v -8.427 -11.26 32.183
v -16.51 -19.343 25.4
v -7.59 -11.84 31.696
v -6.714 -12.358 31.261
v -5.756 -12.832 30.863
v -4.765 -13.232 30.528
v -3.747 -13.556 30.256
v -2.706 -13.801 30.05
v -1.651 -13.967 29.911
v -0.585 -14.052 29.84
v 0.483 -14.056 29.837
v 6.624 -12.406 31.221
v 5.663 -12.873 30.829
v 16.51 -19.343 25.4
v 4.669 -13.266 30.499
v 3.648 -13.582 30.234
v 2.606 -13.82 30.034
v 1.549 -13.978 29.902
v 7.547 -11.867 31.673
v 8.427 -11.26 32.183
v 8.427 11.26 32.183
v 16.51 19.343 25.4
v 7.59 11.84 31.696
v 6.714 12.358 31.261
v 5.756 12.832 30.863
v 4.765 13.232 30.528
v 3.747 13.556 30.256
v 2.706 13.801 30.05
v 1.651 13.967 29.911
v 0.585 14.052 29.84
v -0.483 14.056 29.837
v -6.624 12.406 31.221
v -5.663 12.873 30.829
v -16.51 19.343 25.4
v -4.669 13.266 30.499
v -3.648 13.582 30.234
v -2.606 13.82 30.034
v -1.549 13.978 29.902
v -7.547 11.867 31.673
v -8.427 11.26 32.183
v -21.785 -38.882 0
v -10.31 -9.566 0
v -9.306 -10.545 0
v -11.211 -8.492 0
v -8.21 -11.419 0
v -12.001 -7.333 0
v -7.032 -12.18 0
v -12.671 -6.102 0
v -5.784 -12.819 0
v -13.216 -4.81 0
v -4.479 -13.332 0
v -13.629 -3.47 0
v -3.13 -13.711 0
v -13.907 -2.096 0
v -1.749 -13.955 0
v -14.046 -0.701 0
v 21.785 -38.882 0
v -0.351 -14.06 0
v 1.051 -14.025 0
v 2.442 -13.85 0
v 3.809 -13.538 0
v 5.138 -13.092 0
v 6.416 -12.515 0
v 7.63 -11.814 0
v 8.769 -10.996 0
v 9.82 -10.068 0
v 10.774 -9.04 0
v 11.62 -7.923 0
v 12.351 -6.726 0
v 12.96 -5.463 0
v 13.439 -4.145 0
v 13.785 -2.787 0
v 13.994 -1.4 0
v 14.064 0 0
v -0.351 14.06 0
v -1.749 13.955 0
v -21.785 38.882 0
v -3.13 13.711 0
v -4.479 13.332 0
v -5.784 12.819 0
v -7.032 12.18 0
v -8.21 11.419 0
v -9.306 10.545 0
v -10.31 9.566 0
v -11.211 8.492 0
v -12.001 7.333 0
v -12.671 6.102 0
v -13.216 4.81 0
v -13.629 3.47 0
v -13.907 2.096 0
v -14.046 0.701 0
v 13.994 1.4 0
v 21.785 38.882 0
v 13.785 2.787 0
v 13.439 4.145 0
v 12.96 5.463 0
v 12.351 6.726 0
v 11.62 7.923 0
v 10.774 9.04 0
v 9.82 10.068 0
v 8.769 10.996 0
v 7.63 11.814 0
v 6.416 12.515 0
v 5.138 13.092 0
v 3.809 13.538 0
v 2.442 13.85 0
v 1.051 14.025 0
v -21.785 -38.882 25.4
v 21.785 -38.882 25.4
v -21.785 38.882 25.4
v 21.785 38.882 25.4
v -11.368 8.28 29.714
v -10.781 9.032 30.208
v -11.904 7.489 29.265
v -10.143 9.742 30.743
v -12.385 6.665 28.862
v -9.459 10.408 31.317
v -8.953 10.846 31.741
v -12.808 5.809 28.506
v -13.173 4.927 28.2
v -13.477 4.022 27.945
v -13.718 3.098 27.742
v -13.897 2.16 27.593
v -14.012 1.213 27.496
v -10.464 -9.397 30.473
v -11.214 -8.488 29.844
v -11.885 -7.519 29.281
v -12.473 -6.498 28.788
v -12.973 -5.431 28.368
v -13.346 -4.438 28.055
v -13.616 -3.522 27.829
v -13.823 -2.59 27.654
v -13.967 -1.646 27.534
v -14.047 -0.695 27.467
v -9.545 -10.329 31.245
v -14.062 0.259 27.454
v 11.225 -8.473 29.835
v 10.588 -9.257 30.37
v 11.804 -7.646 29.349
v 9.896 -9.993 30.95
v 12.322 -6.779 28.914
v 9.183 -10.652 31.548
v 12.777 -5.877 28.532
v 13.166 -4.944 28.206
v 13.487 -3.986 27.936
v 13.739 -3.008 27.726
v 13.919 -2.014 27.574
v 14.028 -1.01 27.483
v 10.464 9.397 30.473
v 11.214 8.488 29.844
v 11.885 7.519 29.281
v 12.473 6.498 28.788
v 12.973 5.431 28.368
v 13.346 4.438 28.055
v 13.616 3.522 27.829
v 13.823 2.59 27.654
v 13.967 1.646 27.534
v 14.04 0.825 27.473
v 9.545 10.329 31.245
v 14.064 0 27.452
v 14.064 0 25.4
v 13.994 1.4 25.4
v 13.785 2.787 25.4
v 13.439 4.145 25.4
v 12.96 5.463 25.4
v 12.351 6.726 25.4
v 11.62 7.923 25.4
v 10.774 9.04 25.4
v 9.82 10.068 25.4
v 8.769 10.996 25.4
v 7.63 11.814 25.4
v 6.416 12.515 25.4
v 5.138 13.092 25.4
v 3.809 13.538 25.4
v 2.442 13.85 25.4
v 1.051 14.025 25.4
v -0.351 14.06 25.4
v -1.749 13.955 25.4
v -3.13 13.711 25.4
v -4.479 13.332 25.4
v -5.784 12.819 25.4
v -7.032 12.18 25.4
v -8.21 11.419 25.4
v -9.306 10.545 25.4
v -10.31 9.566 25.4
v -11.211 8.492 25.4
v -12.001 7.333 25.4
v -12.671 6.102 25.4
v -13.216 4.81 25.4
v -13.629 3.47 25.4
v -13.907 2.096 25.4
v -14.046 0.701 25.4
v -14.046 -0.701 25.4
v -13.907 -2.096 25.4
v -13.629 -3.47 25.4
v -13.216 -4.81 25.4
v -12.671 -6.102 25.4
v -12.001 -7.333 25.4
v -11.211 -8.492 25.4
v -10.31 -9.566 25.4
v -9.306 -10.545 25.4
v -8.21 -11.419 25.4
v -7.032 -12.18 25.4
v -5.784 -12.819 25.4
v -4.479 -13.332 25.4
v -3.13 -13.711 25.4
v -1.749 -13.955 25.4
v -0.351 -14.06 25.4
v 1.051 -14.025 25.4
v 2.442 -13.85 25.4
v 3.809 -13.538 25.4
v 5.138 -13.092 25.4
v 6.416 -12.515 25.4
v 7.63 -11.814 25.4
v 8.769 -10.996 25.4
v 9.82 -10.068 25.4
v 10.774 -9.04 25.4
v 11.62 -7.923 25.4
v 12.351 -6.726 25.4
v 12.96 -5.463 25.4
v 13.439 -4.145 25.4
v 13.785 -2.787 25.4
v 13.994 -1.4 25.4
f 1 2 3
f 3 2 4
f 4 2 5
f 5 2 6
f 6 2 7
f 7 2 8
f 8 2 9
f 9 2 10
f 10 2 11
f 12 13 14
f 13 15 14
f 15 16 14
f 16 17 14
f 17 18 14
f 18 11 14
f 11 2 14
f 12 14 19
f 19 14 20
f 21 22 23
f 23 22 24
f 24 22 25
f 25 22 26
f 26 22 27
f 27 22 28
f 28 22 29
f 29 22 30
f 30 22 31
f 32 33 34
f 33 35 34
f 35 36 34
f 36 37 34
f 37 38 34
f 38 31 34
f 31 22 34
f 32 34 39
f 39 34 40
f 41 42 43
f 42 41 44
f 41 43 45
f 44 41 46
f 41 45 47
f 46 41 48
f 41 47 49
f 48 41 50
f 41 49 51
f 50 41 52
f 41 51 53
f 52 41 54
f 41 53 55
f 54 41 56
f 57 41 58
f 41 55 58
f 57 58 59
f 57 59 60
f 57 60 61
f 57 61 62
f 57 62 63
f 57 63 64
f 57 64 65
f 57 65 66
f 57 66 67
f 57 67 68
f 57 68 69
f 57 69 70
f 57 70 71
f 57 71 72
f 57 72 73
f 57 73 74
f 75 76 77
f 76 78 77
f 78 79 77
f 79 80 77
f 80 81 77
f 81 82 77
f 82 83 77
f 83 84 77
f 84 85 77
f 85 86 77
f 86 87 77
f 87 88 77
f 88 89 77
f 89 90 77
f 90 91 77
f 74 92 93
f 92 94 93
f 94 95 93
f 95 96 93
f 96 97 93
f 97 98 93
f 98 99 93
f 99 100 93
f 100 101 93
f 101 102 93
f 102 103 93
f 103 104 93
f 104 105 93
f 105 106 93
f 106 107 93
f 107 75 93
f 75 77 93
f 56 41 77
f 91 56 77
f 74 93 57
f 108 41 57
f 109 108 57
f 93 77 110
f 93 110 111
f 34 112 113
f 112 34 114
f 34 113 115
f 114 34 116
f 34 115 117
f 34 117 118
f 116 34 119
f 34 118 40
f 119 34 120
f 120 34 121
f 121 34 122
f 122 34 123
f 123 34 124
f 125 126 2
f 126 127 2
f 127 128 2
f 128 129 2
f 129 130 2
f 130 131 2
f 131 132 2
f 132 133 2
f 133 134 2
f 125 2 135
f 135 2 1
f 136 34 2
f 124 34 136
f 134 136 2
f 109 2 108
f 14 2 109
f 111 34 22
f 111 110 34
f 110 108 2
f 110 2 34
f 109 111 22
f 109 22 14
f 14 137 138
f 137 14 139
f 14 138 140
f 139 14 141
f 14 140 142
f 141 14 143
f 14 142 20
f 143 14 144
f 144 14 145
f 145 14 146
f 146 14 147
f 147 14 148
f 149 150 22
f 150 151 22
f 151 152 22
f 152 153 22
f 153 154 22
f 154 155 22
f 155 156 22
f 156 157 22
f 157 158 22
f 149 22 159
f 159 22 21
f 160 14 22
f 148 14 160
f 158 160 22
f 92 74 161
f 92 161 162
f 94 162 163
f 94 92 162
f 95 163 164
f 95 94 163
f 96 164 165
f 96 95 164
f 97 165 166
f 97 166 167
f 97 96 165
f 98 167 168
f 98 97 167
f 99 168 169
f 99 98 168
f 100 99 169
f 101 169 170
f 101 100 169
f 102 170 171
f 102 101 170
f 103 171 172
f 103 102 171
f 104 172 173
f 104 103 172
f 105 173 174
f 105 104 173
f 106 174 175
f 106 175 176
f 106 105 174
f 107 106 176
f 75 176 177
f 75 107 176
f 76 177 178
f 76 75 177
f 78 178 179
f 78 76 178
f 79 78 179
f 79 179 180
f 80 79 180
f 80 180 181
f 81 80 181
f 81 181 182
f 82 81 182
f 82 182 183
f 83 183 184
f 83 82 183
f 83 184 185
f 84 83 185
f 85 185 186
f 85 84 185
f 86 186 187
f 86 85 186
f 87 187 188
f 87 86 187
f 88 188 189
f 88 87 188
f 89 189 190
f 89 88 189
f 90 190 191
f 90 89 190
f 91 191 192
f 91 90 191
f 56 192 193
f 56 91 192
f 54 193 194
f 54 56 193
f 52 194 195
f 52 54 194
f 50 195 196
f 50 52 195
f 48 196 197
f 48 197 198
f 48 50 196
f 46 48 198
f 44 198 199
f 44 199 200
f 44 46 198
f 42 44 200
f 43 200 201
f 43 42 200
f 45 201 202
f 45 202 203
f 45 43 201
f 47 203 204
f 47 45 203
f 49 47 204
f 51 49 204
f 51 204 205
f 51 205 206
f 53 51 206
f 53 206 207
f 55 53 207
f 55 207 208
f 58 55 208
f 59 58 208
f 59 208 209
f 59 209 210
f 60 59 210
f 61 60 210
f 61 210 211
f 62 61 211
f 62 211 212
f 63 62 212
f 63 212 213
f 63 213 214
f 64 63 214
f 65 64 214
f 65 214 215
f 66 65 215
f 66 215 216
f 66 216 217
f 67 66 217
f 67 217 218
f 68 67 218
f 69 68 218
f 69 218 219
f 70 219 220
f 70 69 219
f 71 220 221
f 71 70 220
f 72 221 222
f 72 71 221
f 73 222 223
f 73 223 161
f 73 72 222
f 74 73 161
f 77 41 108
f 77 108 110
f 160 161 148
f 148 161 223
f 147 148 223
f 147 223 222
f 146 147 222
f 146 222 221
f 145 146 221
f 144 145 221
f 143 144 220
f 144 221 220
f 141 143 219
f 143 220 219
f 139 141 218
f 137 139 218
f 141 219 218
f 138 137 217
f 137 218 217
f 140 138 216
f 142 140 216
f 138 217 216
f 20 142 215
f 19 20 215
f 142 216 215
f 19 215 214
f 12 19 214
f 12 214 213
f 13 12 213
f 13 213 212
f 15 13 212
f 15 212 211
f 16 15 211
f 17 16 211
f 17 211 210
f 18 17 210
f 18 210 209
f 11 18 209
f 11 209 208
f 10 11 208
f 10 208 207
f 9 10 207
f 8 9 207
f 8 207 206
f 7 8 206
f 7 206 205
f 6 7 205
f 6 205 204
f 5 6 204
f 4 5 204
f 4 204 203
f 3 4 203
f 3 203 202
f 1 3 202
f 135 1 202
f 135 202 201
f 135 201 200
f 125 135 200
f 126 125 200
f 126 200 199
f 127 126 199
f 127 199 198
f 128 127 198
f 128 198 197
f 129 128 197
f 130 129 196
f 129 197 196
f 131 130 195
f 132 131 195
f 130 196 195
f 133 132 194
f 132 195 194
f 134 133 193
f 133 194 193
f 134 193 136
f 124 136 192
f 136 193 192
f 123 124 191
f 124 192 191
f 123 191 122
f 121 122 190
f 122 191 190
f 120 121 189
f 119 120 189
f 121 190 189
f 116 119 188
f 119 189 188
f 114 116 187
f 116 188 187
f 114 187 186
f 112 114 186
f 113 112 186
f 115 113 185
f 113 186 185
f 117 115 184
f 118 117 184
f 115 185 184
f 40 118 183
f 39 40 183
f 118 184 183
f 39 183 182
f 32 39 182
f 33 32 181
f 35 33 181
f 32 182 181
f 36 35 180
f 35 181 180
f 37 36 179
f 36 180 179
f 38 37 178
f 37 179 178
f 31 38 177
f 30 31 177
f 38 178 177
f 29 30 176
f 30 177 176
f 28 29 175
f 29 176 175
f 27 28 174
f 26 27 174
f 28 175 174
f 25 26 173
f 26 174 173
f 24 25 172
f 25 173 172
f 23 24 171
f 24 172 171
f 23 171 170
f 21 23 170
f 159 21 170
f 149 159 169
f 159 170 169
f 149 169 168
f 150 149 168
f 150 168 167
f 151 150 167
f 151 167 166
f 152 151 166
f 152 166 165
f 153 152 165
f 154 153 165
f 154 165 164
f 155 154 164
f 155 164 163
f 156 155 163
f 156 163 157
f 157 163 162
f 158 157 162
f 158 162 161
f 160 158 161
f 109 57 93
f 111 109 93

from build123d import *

# Parameters (mm, degrees)
F0_W     = 43.5707718134
F0_H     = 77.7630805969
F0_R     = 14.0639610487
F1_DEPTH = 25.4
F2_W     = 33.0200046301
F2_H     = 38.6861525476
F3_DEPTH = 25.4
F3_TAPER = 50
F4_R     = 14.0639610487
F5_DEPTH = 25.4


with BuildPart() as f1:
    # F0 (on Top) → F1 (new body)
    with BuildSketch(Plane.XY):
        Rectangle(F0_W, F0_H)
        Circle(F0_R, mode=Mode.SUBTRACT)
    extrude(amount=F1_DEPTH)

    # F2 (on face) → F3 (join)
    with BuildSketch(Plane.XY.offset(25.4)):
        Rectangle(F2_W, F2_H)
    extrude(amount=F3_DEPTH, taper=F3_TAPER)

    # F4 (on face) → F5 (cut)
    with BuildSketch(Plane(origin=(0, 0, 25.4), x_dir=(1, 0, 0), z_dir=(0, 0, -1))):
        Circle(F4_R)
    extrude(amount=-F5_DEPTH, mode=Mode.SUBTRACT)


solid = f1.part
